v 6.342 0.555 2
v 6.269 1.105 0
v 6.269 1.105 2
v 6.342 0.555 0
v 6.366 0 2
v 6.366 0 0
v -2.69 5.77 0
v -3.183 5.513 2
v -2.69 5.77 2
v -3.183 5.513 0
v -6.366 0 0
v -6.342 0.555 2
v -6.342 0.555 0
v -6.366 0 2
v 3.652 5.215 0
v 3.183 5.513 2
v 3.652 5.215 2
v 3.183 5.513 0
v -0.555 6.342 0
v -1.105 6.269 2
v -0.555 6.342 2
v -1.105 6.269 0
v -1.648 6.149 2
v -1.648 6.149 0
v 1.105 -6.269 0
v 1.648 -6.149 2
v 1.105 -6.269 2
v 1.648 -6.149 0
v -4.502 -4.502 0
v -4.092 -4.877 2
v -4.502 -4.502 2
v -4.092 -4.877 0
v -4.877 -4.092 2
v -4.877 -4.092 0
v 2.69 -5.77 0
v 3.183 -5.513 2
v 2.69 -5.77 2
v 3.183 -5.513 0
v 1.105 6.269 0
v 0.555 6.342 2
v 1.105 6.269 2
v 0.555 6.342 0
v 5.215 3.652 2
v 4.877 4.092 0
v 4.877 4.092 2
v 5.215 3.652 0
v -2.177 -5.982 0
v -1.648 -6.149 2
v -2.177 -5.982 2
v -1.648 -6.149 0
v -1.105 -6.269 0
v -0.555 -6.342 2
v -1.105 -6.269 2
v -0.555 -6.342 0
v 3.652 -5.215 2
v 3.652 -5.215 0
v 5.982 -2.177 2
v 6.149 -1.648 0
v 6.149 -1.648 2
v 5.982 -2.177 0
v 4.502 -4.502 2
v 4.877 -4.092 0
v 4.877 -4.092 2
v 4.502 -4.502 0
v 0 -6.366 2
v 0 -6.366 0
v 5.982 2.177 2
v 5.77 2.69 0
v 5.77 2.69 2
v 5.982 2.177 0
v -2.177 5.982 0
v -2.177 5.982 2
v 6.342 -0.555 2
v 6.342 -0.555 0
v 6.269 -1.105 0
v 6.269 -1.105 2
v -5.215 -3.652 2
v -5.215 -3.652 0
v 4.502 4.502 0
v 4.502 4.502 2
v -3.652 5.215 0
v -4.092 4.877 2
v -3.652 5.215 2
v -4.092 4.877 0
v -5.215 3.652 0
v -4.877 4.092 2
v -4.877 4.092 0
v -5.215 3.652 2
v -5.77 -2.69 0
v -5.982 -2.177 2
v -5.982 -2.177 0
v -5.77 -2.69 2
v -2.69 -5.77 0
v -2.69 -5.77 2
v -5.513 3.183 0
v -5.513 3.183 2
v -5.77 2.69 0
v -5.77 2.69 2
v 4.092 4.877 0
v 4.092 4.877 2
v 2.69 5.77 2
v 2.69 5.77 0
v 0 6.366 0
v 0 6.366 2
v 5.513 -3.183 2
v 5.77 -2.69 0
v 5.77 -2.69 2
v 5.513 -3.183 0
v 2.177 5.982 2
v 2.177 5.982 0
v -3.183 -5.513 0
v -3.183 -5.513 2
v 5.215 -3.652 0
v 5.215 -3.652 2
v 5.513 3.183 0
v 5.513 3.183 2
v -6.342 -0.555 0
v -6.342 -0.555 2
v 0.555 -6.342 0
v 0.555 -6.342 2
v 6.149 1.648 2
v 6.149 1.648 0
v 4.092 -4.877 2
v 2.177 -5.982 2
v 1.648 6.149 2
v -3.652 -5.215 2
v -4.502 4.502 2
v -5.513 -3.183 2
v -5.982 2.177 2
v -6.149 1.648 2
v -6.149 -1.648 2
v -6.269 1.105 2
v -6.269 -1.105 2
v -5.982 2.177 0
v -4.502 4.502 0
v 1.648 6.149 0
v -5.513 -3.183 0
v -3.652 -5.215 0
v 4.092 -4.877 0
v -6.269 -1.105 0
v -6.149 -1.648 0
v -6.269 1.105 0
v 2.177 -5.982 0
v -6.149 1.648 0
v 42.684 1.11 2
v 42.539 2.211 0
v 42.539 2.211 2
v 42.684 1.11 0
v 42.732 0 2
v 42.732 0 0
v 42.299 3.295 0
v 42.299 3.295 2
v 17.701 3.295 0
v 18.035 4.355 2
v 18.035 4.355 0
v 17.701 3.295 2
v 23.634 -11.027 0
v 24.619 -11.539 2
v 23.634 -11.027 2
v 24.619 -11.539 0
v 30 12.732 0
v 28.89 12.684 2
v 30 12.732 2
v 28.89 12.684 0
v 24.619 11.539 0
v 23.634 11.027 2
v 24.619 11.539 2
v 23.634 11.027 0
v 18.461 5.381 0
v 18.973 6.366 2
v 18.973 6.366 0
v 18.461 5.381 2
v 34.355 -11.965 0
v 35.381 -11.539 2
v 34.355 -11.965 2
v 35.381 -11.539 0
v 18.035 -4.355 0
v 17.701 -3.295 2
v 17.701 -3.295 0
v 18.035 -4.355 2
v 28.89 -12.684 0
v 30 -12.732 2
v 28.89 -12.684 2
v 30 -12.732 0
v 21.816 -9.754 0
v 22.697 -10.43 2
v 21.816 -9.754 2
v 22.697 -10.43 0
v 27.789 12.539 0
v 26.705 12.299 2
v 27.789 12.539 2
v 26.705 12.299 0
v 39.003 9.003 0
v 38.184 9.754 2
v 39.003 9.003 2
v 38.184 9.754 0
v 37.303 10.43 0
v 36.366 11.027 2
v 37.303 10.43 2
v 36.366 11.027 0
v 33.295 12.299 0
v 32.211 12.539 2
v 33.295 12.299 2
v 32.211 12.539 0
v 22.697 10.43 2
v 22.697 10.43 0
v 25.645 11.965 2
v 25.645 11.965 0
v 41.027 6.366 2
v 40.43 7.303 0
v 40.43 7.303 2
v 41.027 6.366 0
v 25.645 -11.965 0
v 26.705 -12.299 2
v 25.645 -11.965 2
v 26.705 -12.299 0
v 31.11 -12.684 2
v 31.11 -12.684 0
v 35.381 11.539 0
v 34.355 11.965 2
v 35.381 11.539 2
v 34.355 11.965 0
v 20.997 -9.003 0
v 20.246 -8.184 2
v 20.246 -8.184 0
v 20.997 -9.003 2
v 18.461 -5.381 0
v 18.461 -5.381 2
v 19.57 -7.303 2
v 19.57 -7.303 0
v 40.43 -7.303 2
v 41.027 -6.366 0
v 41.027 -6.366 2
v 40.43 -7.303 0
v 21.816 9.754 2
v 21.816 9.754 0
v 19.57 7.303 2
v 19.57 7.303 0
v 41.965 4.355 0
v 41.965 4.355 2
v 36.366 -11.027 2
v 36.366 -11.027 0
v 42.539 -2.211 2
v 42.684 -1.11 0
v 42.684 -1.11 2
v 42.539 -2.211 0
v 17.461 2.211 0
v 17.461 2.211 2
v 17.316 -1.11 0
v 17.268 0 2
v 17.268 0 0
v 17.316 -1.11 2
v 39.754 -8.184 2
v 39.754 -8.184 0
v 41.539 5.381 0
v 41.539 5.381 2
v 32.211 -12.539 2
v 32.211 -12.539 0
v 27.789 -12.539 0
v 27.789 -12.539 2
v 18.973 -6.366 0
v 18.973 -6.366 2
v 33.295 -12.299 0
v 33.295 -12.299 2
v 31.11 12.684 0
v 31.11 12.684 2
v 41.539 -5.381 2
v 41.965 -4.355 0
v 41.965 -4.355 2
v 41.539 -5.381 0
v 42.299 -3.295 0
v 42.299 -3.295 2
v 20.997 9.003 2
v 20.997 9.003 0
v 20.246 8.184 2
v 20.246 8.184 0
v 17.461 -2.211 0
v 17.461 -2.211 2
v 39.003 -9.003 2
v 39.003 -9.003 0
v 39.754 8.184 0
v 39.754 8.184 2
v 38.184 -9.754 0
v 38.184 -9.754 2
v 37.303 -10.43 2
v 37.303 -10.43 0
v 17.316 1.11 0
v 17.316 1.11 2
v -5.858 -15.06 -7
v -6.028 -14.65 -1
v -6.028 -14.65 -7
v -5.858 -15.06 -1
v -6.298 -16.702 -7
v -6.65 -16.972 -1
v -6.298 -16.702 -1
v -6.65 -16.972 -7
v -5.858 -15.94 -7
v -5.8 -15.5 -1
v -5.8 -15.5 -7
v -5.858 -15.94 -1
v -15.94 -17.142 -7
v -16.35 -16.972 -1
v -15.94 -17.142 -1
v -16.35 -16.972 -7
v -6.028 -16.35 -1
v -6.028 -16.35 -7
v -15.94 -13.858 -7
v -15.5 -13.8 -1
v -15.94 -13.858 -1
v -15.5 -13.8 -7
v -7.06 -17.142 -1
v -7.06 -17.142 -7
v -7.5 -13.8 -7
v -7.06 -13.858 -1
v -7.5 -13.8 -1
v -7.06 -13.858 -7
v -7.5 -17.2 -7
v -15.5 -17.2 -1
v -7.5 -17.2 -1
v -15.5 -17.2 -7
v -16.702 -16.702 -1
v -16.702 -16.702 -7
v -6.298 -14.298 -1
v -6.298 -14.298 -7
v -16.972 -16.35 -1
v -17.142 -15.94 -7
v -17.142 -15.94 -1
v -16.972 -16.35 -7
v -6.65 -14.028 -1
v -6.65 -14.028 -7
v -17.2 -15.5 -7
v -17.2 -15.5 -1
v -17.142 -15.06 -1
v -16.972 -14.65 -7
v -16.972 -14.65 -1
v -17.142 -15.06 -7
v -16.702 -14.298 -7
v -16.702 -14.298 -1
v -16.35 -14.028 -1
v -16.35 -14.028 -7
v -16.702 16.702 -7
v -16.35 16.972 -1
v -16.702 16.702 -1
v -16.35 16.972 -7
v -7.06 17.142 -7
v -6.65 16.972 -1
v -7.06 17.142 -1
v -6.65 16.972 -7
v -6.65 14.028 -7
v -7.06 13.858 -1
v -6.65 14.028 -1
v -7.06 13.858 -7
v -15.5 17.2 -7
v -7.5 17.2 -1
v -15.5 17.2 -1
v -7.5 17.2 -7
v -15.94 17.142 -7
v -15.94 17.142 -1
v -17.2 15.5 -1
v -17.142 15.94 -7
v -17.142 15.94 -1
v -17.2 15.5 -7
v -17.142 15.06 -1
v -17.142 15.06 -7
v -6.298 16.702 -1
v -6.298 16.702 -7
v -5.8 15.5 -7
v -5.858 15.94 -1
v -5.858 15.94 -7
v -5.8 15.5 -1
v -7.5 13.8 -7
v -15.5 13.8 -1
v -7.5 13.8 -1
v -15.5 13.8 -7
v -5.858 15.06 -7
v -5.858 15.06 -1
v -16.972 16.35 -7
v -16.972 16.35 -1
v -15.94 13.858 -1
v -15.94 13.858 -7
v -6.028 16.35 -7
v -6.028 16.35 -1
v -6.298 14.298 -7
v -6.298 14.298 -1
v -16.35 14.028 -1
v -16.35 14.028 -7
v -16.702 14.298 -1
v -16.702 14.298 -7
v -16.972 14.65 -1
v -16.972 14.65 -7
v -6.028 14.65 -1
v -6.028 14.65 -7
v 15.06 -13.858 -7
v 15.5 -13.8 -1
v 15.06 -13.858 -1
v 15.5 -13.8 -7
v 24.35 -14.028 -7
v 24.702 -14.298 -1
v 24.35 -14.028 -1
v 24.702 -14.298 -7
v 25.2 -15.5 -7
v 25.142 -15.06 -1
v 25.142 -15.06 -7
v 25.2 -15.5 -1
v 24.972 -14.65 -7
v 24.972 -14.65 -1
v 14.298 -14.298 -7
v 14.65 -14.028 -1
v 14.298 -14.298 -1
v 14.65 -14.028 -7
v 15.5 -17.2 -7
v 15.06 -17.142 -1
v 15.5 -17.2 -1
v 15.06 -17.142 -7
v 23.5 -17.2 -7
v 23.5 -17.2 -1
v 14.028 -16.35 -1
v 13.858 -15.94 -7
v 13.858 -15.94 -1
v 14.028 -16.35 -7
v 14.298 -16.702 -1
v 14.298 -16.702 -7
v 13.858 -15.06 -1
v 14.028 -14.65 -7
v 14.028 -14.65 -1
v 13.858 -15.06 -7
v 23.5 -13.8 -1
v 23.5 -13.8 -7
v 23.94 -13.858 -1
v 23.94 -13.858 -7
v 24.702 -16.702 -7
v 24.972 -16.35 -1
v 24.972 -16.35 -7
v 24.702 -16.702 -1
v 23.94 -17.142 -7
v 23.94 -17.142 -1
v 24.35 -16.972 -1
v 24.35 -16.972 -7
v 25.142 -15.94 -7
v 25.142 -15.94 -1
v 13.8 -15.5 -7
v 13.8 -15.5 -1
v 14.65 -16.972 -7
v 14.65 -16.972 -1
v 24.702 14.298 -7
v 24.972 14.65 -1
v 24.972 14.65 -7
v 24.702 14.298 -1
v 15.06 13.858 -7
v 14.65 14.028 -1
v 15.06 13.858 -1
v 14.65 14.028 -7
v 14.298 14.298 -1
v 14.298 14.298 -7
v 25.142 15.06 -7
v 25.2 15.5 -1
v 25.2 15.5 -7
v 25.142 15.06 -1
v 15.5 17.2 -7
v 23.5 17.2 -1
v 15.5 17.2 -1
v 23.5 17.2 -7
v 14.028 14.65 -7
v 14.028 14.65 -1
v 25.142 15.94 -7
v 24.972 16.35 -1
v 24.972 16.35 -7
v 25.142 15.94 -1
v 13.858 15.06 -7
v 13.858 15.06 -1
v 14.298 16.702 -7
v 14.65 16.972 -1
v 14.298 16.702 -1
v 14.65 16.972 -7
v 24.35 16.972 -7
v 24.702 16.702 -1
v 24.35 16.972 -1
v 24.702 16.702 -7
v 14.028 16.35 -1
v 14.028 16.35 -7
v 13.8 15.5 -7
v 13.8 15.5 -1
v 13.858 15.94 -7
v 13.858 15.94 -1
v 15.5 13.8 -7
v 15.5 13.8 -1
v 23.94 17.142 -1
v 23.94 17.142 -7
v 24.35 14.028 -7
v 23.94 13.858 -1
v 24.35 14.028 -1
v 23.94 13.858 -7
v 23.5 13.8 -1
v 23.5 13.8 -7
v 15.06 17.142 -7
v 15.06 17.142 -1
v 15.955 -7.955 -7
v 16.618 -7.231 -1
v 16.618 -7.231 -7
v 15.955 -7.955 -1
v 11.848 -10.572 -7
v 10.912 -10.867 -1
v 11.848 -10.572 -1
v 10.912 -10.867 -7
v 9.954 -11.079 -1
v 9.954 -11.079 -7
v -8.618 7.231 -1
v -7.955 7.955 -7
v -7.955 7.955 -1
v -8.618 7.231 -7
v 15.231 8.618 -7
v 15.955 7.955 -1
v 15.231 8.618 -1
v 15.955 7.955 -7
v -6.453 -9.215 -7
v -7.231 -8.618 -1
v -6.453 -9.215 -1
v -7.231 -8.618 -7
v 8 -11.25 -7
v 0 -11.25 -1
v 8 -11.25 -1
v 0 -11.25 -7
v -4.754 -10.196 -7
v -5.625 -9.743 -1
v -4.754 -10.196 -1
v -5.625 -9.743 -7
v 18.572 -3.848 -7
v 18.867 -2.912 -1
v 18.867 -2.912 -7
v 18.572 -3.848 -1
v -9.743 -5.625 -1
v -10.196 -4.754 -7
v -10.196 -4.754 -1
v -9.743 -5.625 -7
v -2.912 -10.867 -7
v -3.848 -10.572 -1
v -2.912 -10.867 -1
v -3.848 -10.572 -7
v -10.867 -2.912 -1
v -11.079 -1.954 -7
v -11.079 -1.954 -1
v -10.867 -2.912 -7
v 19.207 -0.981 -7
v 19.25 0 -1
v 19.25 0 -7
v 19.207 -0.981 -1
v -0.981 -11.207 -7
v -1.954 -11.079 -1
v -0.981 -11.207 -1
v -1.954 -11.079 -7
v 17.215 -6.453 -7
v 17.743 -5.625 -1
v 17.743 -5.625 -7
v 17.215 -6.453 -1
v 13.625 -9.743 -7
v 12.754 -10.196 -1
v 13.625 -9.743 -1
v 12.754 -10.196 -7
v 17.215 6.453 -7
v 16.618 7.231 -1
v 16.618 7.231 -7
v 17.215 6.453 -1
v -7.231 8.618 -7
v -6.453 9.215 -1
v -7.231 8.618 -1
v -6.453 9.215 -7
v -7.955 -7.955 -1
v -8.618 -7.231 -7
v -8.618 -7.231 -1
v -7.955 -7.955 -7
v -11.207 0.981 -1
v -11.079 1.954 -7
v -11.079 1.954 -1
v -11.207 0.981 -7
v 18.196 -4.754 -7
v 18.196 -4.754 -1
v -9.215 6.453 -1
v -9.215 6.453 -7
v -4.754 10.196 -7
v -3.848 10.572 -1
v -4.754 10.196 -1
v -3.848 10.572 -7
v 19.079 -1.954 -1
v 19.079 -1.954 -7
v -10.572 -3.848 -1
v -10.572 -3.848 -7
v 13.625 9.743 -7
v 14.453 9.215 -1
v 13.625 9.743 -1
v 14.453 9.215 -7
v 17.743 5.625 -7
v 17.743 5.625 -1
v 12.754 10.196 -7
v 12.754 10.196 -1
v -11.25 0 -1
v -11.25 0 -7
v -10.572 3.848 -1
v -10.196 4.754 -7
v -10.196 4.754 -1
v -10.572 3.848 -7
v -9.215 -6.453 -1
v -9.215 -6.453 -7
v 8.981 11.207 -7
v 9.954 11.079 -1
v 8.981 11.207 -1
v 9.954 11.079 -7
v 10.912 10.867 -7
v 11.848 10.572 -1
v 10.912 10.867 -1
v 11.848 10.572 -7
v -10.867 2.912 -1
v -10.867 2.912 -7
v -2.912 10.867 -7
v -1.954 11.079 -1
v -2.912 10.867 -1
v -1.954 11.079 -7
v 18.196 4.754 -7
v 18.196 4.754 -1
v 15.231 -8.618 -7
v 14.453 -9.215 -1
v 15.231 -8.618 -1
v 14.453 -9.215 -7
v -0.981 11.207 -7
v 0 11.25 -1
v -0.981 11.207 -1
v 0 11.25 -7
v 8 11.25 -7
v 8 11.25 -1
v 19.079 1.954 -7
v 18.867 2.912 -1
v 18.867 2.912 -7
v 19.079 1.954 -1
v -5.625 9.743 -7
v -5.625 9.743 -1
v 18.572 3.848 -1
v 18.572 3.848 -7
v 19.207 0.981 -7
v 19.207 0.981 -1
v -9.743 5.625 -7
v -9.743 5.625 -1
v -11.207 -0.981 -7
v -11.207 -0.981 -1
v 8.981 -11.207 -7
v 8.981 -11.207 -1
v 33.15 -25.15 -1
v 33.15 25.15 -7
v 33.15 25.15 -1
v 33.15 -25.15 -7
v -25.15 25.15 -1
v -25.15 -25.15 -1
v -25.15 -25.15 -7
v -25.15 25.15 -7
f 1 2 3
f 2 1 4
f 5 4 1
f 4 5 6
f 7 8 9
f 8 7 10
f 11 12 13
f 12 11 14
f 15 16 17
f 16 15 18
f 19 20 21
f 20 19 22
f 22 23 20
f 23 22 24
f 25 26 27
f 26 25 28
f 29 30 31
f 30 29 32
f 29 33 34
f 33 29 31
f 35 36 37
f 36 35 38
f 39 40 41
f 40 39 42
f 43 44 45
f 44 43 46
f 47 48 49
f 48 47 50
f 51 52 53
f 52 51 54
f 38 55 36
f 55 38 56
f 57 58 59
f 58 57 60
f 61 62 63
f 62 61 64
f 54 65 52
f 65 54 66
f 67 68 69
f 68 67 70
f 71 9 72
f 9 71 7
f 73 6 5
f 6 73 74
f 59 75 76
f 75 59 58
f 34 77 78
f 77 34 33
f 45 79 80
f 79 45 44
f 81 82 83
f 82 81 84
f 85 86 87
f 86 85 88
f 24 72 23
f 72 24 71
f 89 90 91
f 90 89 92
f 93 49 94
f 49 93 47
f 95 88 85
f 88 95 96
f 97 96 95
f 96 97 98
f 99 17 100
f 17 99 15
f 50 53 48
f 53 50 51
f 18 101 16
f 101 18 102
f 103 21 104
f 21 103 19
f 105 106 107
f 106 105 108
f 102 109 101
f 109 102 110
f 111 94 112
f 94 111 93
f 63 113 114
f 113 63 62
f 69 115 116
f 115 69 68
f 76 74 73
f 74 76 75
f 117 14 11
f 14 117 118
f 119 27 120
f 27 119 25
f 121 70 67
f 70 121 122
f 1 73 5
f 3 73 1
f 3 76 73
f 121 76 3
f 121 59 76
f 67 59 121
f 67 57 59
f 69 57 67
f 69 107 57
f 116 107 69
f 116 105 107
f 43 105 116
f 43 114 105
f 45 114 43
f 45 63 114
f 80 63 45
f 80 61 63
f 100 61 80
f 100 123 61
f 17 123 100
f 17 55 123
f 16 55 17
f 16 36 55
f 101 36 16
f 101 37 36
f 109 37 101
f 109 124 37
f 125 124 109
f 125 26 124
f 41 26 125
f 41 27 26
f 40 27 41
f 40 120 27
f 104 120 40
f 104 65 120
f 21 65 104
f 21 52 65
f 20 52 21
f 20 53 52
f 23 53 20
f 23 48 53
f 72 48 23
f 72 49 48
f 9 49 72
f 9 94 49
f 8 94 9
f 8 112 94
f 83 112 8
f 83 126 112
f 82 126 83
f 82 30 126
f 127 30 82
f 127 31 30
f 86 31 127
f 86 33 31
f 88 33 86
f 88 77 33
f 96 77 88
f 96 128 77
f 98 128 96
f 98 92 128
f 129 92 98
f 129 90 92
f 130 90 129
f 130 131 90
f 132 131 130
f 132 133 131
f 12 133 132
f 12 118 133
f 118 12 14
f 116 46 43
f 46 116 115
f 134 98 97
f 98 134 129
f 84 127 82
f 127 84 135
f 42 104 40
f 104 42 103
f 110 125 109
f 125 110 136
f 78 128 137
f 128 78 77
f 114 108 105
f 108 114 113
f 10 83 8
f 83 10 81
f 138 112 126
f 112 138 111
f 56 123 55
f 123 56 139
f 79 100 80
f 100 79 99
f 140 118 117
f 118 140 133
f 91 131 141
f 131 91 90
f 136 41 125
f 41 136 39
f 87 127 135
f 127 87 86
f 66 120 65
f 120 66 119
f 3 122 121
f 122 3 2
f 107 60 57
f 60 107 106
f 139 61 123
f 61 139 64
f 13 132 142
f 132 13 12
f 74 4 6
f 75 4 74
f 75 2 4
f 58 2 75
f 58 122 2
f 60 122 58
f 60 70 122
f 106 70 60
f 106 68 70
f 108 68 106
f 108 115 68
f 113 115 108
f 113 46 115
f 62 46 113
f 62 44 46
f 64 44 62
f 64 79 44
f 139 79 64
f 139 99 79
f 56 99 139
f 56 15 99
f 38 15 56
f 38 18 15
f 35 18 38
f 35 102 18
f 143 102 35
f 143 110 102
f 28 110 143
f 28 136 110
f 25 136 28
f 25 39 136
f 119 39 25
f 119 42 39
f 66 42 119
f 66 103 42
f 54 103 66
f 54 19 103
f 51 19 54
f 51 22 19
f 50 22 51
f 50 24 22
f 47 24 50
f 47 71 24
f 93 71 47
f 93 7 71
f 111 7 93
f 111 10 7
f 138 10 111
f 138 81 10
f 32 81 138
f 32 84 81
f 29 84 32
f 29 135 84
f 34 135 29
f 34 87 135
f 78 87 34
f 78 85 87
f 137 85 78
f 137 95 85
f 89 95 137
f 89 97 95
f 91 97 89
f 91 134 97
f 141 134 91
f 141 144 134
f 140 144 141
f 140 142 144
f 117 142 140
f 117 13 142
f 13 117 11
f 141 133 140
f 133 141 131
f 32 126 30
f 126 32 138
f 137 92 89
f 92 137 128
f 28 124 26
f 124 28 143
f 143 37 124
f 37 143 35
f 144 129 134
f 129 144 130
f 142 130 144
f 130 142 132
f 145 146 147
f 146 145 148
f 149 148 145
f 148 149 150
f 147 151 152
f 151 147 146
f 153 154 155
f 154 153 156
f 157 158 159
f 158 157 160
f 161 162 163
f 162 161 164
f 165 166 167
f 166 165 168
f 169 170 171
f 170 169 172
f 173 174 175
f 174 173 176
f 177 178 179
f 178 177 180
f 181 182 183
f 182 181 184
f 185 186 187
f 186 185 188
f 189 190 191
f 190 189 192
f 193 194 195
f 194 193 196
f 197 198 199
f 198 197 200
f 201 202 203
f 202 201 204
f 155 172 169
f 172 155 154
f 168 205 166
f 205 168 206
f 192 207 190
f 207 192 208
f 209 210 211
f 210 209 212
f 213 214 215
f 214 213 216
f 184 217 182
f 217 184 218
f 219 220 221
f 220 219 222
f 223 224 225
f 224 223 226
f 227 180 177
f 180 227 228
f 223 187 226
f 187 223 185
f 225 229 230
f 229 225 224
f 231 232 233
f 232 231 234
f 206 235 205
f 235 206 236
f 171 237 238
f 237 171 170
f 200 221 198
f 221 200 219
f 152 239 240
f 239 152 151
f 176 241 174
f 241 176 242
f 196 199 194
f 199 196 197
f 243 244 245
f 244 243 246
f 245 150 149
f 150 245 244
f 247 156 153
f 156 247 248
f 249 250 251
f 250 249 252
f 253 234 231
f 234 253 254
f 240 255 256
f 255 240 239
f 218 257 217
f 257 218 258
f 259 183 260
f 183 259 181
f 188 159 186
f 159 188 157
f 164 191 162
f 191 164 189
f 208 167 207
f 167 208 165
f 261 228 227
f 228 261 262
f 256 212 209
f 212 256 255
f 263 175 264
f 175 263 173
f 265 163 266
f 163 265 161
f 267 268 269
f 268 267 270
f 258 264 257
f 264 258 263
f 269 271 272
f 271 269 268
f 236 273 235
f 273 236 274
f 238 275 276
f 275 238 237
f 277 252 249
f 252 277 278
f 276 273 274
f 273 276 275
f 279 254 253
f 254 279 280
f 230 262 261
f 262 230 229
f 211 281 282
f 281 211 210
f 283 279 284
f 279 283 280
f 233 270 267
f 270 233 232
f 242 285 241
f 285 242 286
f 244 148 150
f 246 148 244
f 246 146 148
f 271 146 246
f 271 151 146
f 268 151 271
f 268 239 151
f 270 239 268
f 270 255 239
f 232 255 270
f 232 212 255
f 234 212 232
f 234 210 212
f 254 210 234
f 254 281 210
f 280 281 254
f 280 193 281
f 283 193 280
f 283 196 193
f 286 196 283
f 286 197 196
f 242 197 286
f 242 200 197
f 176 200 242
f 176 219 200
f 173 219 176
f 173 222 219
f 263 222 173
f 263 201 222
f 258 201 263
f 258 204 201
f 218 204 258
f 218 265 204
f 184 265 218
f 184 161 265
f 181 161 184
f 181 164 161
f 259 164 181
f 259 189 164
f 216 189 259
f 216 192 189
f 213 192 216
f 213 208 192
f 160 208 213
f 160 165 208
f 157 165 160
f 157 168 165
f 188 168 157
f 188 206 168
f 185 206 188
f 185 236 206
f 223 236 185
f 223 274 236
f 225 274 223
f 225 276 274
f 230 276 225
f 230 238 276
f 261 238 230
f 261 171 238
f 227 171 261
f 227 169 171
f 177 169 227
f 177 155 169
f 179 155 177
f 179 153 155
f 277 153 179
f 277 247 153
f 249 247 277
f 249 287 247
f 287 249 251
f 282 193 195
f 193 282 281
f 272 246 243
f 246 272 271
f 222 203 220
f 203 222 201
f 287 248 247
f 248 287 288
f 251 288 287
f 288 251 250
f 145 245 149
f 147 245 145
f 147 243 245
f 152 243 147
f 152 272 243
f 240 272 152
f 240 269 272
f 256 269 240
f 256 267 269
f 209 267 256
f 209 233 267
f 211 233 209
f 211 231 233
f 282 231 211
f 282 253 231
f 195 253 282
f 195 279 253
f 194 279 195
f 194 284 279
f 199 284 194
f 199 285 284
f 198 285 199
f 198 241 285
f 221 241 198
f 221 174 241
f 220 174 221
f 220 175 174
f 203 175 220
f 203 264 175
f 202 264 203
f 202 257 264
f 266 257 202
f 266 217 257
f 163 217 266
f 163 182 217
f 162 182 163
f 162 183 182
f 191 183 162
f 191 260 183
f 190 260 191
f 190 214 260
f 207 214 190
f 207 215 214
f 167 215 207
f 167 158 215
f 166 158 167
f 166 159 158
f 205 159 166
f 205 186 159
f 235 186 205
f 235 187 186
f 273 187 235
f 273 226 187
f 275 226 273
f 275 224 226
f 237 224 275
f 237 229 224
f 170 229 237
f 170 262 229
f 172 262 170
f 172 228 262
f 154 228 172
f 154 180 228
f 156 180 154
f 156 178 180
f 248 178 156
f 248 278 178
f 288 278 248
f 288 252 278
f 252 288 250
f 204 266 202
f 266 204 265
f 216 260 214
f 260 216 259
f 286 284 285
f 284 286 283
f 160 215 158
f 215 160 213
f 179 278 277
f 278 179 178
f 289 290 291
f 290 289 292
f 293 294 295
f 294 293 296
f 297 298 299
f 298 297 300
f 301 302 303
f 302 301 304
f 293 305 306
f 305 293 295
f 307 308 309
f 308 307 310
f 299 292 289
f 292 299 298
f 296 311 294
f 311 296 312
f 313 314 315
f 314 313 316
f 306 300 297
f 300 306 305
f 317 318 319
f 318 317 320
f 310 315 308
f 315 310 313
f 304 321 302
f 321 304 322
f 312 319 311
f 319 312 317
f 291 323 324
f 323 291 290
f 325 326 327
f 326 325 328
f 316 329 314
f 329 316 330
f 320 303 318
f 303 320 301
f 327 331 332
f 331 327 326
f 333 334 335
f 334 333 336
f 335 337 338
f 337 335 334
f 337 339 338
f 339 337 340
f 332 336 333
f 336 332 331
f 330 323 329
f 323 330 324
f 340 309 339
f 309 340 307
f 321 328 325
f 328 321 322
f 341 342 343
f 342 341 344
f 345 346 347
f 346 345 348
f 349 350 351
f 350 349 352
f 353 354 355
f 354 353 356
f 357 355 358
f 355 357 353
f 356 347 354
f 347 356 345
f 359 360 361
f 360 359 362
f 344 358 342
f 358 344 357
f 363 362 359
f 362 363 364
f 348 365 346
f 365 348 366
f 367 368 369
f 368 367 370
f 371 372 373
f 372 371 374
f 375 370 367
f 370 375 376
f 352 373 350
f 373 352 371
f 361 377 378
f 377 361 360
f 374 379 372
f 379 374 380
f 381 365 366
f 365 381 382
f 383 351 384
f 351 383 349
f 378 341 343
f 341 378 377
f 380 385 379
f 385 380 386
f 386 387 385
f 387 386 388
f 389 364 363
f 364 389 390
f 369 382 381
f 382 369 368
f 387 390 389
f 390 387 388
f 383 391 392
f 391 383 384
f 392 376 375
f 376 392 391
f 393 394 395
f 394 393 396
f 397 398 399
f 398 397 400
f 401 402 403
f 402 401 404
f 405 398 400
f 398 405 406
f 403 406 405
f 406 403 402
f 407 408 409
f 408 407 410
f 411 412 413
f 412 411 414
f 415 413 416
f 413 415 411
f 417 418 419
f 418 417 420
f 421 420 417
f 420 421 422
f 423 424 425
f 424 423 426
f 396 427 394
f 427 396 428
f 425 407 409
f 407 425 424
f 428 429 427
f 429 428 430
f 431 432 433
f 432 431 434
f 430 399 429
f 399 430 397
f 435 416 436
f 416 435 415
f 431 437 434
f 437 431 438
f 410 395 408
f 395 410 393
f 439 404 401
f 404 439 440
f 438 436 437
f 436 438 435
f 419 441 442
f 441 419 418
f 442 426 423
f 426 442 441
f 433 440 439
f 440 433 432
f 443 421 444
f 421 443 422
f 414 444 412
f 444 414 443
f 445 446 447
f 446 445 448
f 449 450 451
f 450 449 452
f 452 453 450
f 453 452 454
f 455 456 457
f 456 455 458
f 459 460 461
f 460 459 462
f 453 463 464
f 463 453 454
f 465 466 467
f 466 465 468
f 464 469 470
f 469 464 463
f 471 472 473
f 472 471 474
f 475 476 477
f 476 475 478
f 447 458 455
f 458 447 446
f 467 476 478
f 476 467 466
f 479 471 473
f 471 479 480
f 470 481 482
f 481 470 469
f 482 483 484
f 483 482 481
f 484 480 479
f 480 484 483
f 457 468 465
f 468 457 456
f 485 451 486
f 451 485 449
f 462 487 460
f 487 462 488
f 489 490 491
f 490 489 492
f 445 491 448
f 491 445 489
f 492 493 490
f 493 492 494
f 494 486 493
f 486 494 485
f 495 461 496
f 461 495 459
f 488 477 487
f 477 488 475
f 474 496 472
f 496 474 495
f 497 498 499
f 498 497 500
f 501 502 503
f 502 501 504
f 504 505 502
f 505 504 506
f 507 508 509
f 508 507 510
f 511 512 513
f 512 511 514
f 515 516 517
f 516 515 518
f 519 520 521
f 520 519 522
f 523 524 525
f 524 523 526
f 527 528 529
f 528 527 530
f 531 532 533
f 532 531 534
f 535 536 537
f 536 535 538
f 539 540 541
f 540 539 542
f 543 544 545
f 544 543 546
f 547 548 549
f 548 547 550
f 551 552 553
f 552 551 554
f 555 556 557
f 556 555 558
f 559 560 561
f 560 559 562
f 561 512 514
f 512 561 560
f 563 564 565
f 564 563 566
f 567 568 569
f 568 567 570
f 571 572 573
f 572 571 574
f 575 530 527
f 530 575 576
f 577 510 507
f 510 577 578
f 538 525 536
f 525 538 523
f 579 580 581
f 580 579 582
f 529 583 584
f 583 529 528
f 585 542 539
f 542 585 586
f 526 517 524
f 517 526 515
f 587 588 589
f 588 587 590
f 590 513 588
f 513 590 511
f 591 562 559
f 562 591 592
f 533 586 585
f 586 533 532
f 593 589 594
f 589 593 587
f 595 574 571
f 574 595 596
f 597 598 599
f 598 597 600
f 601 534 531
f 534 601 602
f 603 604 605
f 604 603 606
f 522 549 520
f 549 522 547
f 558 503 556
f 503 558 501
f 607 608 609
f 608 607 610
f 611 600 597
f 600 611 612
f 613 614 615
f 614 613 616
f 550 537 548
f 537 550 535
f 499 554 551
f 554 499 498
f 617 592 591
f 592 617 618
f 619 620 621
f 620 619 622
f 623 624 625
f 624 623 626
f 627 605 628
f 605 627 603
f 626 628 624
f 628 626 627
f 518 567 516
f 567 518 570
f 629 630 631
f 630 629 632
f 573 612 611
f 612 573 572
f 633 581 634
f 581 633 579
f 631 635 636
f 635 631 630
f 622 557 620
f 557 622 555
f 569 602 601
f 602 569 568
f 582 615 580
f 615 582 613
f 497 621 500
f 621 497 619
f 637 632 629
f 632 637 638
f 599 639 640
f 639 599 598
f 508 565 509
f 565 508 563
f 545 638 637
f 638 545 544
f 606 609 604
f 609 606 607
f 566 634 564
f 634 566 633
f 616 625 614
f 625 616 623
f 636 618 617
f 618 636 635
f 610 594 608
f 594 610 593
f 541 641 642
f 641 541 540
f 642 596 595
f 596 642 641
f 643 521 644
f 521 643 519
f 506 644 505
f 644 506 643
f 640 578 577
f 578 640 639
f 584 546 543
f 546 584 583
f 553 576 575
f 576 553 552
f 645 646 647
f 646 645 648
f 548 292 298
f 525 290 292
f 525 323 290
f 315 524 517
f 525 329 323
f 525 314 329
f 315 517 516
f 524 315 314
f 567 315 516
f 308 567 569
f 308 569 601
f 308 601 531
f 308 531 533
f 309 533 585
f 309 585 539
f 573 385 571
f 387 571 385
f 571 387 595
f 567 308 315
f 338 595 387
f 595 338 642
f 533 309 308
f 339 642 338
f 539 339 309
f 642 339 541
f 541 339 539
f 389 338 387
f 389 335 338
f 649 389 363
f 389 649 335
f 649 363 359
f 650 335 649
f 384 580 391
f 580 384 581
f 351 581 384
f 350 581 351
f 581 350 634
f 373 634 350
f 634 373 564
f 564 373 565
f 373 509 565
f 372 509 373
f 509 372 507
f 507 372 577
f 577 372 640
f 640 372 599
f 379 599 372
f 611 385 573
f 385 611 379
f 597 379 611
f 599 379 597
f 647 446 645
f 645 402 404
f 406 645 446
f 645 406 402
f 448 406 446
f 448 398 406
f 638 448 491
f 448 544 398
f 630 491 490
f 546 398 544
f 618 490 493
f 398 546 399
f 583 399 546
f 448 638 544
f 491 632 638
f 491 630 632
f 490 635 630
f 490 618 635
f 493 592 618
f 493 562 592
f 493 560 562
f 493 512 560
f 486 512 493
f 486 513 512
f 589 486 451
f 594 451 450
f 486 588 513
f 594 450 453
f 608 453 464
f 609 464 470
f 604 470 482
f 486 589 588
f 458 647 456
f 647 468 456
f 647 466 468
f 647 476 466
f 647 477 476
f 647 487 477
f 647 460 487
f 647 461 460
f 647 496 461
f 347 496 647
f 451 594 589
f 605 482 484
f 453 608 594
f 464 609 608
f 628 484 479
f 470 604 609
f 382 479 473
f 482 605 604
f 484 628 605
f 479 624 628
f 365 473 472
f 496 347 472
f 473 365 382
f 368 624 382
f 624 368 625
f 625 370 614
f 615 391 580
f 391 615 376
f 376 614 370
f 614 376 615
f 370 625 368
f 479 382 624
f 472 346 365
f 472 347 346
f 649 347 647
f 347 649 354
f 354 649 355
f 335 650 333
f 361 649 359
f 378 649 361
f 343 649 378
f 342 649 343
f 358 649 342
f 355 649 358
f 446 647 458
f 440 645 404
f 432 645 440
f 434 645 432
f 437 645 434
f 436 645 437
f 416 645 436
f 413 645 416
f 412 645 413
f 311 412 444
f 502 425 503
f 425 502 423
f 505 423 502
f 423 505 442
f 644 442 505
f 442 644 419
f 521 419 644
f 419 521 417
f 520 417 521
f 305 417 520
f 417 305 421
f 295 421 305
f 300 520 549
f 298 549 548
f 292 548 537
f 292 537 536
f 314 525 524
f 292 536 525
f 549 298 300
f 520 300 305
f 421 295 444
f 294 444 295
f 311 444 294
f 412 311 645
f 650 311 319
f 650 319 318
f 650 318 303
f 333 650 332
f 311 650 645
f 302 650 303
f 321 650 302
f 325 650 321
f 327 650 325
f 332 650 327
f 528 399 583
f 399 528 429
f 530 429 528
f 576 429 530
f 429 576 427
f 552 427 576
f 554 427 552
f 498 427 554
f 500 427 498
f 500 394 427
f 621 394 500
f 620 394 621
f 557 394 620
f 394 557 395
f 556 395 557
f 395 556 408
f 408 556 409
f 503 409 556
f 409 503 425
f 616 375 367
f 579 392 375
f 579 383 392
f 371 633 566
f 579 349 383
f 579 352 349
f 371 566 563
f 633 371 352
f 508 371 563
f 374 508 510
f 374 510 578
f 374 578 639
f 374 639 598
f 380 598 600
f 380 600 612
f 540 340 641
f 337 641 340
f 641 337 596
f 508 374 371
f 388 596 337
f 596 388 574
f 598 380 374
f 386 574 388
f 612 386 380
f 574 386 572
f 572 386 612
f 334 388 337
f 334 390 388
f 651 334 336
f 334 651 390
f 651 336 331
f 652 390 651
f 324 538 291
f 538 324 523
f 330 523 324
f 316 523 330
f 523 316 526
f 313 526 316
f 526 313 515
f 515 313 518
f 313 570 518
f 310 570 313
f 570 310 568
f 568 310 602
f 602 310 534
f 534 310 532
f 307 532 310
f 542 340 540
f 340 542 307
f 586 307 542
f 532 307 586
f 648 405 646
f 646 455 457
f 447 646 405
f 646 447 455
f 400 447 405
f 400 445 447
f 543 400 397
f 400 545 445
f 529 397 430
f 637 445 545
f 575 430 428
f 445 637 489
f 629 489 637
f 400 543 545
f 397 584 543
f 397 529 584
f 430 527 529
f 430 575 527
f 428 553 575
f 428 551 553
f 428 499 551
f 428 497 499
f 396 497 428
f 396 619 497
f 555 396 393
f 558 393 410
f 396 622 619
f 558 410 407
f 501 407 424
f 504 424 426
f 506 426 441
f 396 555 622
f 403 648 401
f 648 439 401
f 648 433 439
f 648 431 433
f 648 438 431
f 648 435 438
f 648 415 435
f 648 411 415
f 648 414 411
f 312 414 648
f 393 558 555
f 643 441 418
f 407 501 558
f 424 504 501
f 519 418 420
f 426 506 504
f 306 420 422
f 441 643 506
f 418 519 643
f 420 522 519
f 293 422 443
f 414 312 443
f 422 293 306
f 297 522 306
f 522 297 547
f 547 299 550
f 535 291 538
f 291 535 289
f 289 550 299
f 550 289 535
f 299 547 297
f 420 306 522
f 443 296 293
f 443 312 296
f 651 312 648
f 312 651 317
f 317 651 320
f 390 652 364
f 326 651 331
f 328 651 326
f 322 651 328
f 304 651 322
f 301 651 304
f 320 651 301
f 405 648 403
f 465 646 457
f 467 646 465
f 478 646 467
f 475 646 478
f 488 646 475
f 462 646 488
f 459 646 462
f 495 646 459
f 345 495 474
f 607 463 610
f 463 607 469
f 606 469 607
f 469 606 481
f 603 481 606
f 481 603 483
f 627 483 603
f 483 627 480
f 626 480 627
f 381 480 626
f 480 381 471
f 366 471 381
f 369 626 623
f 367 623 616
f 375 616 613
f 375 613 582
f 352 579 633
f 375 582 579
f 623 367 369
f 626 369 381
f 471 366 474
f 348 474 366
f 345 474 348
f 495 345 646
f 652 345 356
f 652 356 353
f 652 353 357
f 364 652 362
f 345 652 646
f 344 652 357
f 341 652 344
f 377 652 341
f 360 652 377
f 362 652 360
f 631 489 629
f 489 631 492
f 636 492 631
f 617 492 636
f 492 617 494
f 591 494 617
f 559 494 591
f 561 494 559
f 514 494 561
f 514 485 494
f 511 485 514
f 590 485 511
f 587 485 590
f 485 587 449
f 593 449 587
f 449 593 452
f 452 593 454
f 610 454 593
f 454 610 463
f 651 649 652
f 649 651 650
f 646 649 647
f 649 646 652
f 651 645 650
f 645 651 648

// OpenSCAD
// ============================================================
//  2:1 GT2 belt pre-stage + slotted NEMA17 tensioning mount
//  Final piece of the joint module (cycloidal_disc + joint_module).
//
//  20T motor pinion -> 40T input-shaft pulley = 2:1
//  x 18:1 cycloidal = 36:1 total.
//
//  Pulleys are CHEAP — buy 20T & 40T GT2 6mm bore-5/8mm; the
//  cylinders below are just to visualise the center distance.
//  Tension by sliding the motor in the slots, then locking.
// ============================================================

PITCH  = 2;          // GT2 tooth pitch (mm)
Tm     = 20;         // motor pinion teeth
Ti     = 40;         // input-shaft pulley teeth
belt_w = 6;          // 6mm GT2

PD_m = Tm*PITCH/PI;  // motor pulley pitch dia  = 12.73
PD_i = Ti*PITCH/PI;  // input pulley pitch dia  = 25.46

C_nom  = 30;         // nominal center distance (fits 122mm closed belt)
travel = 8;          // tensioning slot length (install slack, slide to tension)

// NEMA17 frame
nema  = 42.3;        // body square
holes = 31.0;        // bolt-circle (square) spacing
pilot = 22;          // center pilot boss dia
boltD = 3.4;         // M3 clearance

// Belt pitch-length for a given center distance (mm)
function belt_len(C) = 2*C + PI*(PD_m+PD_i)/2 + pow(PD_i-PD_m,2)/(4*C);

// Slotted NEMA17 cut-out: 4 bolt slots + pilot slot, all along +X
// (the center-distance axis) so the motor slides to tension.
module nema17_slots() {
    for (sx=[-1,1], sy=[-1,1])
        hull() {
            translate([sx*holes/2,        sy*holes/2, 0]) cylinder(d=boltD, h=20, $fn=24);
            translate([sx*holes/2+travel, sy*holes/2, 0]) cylinder(d=boltD, h=20, $fn=24);
        }
    hull() {
        translate([0,0,0])      cylinder(d=pilot+0.5, h=20, $fn=72);
        translate([travel,0,0]) cylinder(d=pilot+0.5, h=20, $fn=72);
    }
}

module motor_plate(t=6) {
    difference() {
        translate([-nema/2-4, -nema/2-4, 0])
            cube([nema+travel+8, nema+8, t]);
        translate([0,0,-1]) nema17_slots();
    }
}

// Visual layout: motor pulley at origin, input pulley at C_nom
module layout() {
    color([.7,.7,.7,.45]) {
        cylinder(d=PD_m, h=2, $fn=72);
        translate([C_nom,0,0]) cylinder(d=PD_i, h=2, $fn=72);
    }
    translate([0,0,-7]) motor_plate();
}

echo(str("Nominal C=", C_nom, "mm  ->  belt pitch length = ",
         belt_len(C_nom), "mm  (use 122mm closed GT2)"));
echo(str("Tension range: C ", C_nom-3, "..", C_nom+travel-3, "mm"));

layout();
// motor_plate();   // <- the part to print
